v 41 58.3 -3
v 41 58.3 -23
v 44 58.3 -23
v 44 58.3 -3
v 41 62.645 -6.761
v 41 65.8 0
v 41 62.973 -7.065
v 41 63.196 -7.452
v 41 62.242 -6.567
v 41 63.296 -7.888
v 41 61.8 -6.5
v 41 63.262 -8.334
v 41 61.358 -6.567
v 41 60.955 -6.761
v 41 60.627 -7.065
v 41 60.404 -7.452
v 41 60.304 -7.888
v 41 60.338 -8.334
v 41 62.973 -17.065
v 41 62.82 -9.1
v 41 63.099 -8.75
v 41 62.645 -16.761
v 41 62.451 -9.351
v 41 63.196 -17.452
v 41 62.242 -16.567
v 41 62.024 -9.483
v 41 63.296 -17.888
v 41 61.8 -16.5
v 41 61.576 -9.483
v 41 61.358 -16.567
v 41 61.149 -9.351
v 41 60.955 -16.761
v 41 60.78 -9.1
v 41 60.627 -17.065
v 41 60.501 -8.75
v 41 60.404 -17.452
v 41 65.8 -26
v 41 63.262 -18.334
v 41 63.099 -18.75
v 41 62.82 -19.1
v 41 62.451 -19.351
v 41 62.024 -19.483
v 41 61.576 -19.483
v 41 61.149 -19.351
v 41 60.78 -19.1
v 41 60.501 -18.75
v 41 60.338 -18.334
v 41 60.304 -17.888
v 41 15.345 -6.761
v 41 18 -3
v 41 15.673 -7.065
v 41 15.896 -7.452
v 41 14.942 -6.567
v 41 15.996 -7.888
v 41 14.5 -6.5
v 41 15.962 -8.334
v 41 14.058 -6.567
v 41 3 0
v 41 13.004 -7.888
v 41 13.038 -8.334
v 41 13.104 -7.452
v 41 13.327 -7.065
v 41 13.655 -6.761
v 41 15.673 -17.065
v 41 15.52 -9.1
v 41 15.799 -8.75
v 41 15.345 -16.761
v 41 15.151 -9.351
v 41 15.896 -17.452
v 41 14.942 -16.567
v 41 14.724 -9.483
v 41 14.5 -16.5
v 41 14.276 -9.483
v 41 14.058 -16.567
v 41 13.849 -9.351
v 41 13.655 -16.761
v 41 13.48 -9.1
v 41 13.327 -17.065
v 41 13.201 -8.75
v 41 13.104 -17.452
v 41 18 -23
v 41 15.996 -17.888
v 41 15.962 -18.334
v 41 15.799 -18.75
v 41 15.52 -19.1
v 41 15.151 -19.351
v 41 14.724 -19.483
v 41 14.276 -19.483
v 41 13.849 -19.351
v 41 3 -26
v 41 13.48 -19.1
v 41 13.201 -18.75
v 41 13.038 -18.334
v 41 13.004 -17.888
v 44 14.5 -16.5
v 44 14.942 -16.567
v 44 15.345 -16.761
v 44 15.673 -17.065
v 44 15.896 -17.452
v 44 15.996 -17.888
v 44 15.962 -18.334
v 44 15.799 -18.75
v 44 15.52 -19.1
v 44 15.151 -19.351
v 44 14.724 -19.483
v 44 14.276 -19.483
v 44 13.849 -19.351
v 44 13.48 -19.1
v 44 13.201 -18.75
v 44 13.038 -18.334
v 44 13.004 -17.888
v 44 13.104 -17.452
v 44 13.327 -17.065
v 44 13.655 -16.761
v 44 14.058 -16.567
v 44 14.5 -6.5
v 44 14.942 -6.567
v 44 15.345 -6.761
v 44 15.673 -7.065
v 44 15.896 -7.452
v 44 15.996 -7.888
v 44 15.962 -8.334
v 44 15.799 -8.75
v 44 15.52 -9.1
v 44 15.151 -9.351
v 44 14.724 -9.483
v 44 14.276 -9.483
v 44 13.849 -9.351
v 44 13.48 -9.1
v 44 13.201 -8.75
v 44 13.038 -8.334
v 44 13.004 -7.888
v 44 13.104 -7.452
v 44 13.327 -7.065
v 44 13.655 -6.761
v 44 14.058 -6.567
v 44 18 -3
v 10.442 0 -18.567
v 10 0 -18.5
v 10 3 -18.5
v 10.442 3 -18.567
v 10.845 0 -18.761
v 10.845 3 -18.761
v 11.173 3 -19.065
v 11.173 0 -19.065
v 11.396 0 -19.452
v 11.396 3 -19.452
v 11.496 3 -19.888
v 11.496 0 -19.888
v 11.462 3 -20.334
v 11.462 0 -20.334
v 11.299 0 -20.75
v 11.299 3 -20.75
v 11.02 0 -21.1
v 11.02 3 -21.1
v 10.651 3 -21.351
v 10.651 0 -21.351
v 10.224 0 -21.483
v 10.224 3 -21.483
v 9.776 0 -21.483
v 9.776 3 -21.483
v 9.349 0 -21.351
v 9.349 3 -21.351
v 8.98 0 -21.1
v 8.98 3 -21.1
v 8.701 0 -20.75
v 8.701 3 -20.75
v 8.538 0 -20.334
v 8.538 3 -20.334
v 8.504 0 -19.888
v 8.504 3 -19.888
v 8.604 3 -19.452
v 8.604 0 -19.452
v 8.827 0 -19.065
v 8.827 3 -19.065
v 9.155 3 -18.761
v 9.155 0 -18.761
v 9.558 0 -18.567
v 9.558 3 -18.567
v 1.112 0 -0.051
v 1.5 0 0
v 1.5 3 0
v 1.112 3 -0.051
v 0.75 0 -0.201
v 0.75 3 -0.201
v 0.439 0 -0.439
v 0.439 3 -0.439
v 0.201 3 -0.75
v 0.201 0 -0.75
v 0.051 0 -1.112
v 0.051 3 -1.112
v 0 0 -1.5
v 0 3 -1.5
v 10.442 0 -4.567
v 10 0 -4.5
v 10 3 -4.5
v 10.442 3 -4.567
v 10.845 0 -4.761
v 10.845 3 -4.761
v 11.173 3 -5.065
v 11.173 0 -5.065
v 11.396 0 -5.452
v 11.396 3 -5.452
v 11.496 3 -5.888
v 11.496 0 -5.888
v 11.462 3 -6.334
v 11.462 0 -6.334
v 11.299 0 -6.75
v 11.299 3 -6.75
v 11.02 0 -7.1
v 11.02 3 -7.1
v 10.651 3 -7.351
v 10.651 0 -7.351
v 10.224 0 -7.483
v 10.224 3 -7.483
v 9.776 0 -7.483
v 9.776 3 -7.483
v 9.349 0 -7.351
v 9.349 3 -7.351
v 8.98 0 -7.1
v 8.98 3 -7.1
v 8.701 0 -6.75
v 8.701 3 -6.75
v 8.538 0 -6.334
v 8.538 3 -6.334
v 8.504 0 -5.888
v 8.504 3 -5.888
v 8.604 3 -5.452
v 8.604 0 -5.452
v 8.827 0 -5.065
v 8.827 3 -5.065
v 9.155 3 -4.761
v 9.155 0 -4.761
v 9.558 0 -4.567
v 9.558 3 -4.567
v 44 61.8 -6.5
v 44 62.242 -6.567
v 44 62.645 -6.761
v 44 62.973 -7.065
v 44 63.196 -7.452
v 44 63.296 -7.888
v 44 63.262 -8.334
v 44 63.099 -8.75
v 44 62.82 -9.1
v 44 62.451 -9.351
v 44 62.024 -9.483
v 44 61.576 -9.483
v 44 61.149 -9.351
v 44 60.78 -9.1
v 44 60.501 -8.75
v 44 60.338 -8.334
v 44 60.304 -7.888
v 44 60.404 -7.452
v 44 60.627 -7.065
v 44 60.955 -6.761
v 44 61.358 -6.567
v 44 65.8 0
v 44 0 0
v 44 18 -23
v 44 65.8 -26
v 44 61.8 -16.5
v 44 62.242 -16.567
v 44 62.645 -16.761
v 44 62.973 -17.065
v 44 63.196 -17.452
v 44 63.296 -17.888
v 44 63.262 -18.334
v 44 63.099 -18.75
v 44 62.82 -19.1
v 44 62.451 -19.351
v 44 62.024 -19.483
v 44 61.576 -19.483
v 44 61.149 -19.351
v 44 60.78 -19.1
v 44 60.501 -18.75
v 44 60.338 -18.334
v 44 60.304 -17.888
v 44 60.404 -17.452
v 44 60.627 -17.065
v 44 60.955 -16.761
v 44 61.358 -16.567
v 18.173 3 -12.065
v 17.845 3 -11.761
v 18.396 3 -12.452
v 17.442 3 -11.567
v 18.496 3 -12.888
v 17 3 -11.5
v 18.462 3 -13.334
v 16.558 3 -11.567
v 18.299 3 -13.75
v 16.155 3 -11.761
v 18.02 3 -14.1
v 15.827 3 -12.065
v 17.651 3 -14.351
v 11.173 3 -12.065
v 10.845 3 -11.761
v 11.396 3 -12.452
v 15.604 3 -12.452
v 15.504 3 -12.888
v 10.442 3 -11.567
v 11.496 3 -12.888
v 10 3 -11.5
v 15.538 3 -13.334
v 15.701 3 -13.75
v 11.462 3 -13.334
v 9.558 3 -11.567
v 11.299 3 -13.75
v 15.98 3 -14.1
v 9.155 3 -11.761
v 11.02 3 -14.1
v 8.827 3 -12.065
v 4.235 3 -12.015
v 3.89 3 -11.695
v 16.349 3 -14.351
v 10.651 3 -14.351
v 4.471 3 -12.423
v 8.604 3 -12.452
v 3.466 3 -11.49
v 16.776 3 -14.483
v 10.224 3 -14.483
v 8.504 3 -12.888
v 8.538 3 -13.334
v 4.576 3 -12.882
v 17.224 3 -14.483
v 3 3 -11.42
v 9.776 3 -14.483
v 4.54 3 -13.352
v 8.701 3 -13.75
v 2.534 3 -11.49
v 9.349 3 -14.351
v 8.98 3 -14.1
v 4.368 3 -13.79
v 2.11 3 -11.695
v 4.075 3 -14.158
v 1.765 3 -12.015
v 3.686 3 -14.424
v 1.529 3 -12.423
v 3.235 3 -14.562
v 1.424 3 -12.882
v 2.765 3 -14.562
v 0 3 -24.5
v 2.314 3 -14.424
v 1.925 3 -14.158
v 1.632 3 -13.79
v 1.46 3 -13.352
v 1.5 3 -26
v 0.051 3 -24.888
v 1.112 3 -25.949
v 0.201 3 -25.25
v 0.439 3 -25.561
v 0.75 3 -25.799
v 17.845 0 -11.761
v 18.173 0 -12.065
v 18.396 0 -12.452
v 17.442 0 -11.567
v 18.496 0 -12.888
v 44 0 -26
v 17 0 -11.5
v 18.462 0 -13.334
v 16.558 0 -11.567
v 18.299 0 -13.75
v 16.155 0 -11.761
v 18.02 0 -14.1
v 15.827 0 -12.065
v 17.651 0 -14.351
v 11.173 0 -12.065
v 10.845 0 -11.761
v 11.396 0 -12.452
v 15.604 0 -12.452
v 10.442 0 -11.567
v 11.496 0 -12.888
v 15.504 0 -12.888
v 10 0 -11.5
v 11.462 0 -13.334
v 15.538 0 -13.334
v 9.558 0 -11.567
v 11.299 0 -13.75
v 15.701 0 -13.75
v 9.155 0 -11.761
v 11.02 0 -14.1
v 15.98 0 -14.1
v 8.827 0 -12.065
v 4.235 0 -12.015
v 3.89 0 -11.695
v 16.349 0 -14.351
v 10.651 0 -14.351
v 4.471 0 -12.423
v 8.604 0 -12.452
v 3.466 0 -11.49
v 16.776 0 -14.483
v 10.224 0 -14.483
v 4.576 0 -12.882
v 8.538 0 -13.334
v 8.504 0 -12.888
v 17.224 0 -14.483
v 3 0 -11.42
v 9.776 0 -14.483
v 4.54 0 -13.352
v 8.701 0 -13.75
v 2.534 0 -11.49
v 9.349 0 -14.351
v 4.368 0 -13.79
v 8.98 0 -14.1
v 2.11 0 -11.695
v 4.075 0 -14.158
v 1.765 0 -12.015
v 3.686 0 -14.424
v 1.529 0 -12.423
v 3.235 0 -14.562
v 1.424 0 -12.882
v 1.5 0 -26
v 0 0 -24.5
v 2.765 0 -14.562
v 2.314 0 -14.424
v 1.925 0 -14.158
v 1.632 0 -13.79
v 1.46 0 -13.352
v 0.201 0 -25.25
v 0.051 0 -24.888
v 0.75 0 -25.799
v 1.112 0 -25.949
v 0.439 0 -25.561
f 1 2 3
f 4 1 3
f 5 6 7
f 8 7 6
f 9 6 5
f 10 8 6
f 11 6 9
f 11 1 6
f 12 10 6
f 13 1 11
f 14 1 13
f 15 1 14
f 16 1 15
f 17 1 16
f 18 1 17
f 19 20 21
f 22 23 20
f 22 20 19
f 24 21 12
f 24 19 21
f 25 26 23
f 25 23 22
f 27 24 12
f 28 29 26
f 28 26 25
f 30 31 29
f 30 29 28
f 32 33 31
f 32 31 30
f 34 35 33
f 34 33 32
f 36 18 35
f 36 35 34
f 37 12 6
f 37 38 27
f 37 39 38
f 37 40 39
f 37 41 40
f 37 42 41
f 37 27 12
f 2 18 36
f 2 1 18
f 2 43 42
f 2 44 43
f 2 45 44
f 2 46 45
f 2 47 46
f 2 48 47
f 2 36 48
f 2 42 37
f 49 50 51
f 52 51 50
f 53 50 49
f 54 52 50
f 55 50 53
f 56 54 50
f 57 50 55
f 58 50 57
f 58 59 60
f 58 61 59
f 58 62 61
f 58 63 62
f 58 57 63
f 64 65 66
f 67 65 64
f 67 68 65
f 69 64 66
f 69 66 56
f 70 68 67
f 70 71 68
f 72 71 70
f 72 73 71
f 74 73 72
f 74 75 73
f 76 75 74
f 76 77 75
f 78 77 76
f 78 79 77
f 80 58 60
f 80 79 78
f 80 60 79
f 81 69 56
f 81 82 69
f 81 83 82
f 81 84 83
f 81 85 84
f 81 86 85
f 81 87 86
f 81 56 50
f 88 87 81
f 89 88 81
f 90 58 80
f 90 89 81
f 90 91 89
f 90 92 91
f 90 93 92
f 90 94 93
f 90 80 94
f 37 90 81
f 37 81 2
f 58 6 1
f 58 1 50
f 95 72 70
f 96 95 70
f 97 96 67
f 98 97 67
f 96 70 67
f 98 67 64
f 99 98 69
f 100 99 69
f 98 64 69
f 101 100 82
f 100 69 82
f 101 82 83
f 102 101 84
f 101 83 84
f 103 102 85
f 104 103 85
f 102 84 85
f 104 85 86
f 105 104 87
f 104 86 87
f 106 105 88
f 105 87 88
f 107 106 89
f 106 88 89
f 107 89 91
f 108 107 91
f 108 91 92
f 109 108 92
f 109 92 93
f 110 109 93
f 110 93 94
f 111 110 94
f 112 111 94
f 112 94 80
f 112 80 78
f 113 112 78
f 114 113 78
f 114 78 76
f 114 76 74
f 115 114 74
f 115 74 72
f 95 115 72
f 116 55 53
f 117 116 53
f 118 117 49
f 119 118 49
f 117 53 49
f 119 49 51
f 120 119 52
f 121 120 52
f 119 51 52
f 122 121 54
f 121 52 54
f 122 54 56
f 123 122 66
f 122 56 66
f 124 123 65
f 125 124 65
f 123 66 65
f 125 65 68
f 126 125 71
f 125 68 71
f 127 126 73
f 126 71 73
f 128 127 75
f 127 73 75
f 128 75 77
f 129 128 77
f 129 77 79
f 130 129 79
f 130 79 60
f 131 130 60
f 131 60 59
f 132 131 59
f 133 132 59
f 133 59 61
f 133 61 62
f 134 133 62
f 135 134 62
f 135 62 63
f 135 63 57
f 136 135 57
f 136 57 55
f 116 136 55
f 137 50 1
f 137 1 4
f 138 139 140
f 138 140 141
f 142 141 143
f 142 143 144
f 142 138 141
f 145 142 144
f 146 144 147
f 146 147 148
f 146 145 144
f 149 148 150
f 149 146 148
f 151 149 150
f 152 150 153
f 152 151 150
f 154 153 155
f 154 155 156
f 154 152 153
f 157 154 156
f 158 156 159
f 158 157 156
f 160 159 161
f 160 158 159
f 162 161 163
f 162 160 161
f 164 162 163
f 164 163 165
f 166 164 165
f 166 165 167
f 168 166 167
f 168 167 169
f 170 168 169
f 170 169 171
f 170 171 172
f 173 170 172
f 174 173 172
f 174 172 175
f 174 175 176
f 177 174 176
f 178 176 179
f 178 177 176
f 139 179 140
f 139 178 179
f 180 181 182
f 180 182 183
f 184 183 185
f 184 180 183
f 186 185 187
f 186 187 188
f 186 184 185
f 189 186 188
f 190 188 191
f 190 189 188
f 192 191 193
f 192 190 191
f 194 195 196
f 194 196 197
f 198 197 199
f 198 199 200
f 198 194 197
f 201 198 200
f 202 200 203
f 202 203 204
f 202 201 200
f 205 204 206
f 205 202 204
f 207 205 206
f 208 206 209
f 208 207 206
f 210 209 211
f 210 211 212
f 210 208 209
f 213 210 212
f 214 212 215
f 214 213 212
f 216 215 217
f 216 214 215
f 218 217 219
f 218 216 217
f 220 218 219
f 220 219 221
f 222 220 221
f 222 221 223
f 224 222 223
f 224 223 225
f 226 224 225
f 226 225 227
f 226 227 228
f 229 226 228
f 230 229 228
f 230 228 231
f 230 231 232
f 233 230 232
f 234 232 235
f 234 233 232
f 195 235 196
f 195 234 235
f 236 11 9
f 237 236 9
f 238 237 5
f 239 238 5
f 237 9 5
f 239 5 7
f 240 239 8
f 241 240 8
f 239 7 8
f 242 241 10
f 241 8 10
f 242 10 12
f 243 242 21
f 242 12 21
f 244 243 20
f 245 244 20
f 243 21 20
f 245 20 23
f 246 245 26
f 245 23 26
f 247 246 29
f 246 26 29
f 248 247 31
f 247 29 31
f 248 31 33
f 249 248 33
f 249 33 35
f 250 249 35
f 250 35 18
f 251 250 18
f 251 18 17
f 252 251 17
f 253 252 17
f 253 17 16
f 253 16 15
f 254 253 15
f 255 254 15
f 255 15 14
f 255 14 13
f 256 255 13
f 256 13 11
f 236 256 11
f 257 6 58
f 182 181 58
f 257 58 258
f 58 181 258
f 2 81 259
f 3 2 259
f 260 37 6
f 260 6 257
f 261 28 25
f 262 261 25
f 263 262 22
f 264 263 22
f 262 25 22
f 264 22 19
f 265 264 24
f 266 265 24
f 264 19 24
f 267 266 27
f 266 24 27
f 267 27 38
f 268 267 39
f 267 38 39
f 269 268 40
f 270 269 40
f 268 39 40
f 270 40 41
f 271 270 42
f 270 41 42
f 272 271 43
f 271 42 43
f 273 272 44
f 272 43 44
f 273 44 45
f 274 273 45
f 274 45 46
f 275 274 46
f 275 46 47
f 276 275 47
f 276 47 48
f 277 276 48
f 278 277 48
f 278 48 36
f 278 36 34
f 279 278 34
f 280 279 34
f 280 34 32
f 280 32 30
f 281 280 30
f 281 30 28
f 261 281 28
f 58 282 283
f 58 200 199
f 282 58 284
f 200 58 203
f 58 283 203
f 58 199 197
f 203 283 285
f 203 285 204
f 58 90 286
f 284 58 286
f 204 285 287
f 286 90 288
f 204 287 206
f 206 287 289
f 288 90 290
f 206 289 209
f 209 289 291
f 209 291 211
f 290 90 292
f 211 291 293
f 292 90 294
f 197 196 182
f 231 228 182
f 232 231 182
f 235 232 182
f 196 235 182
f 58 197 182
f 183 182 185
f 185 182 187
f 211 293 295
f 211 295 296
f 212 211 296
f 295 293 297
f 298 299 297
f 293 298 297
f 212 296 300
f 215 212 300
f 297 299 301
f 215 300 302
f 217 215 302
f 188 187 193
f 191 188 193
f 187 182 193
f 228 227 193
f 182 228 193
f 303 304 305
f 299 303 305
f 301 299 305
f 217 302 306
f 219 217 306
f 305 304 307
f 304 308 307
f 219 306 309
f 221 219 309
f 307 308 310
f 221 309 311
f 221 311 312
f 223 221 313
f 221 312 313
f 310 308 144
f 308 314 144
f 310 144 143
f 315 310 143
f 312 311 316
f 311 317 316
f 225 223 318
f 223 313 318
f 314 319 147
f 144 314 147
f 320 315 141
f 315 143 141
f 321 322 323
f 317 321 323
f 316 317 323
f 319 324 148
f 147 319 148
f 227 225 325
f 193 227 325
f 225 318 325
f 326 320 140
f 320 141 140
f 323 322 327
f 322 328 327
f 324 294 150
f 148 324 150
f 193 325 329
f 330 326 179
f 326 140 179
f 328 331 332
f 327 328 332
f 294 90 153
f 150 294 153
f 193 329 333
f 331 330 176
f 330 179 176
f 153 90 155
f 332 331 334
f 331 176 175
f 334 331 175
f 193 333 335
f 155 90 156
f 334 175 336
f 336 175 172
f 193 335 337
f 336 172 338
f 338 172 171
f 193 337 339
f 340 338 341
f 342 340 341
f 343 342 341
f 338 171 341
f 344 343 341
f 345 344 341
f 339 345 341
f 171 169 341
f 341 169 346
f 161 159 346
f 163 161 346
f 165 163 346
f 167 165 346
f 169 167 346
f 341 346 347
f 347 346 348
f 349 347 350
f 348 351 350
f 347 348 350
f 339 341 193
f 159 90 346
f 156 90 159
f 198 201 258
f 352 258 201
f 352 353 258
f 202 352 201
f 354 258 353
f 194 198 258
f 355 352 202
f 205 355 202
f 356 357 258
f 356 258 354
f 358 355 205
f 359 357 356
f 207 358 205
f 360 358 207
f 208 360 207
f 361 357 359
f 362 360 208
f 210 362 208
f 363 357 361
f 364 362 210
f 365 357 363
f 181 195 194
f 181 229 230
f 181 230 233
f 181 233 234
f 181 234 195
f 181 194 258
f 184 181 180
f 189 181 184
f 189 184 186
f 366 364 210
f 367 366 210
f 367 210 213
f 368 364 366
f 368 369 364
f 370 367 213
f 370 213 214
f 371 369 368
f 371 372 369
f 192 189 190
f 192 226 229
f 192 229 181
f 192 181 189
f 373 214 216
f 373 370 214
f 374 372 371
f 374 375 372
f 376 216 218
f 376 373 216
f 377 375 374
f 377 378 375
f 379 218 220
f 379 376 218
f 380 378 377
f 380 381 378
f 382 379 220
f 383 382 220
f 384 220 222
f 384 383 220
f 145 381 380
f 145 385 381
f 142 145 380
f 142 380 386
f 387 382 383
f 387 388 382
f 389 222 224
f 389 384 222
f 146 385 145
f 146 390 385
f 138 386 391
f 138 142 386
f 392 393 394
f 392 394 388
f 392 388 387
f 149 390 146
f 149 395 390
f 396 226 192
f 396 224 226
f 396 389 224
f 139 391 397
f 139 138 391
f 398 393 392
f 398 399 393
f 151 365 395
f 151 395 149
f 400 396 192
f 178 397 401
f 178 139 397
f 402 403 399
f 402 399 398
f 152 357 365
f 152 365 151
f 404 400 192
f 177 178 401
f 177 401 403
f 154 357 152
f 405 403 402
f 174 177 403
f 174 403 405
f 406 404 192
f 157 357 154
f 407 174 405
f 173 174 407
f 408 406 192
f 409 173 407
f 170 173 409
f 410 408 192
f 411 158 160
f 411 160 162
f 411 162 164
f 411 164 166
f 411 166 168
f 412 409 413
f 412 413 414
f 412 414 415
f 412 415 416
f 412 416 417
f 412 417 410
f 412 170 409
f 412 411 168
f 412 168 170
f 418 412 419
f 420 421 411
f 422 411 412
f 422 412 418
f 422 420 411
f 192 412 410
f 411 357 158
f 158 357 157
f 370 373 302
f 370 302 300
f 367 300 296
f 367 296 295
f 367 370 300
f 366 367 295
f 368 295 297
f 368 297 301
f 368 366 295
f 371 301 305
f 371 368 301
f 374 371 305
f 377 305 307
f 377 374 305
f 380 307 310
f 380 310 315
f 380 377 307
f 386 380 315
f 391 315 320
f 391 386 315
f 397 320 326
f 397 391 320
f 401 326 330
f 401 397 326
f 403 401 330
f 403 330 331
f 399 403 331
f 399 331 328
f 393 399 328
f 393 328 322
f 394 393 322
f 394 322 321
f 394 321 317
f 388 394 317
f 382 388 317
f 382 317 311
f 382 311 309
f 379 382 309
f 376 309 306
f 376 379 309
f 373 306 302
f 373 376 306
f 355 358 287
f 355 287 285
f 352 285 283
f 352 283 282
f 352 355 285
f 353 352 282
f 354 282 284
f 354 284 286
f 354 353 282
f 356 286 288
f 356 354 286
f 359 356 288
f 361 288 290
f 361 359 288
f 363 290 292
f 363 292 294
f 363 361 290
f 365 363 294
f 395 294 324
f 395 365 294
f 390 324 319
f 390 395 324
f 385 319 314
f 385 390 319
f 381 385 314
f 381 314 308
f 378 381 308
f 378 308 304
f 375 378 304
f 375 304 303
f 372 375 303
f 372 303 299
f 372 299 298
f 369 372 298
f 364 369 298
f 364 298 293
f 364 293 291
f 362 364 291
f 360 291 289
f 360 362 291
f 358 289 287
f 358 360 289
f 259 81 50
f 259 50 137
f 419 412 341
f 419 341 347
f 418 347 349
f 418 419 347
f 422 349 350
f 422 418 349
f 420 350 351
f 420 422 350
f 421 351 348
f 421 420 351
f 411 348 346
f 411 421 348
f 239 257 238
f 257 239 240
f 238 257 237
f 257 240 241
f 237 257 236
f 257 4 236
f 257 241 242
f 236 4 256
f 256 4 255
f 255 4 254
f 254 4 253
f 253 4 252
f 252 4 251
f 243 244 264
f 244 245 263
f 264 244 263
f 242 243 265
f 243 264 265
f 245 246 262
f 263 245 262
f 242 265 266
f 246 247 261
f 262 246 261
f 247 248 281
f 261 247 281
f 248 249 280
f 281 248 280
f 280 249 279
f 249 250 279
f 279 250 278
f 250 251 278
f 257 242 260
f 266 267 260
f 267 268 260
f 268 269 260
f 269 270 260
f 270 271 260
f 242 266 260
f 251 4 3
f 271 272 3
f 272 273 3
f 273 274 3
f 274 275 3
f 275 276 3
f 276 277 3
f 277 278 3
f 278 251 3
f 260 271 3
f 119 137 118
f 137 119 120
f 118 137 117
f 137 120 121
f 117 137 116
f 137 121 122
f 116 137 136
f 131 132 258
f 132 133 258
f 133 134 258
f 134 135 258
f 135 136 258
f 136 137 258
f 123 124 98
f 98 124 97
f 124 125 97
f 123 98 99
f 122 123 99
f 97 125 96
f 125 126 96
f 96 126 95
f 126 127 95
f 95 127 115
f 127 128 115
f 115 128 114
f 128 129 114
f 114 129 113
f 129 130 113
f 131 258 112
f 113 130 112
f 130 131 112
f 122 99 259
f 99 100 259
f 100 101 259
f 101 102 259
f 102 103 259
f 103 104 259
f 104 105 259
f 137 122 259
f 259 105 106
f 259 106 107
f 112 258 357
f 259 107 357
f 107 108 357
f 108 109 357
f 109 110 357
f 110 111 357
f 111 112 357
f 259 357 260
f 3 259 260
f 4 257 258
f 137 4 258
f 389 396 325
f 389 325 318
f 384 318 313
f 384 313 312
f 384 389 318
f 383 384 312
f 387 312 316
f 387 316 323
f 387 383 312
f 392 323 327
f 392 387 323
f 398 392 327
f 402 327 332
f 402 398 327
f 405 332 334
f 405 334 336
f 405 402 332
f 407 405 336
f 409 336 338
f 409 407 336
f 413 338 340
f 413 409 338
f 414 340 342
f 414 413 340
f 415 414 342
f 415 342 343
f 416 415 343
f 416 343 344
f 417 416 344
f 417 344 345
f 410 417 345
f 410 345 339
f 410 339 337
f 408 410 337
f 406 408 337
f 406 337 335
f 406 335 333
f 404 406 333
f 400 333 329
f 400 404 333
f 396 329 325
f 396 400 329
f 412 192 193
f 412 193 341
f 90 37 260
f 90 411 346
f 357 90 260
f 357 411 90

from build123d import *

# Parameters (mm, degrees)
CROQUIS1_R              = 1.5
CROQUIS1_R_2            = 1.58
SALIENTE_EXTRUIR1_DEPTH = 3
CROQUIS2_W              = 3
CROQUIS2_H              = 26
SALIENTE_EXTRUIR2_DEPTH = 15
CROQUIS3_R              = 1.5
CORTAR_EXTRUIR1_DEPTH   = 15
CROQUIS4_W              = 3
CROQUIS4_H              = 3
SALIENTE_EXTRUIR3_DEPTH = 40.3
CROQUIS5_W              = 3
CROQUIS5_H              = 26
SALIENTE_EXTRUIR5_DEPTH = 7.5
CROQUIS6_R              = 1.5
CORTAR_EXTRUIR2_DEPTH   = 7.5


with BuildPart() as part:
    # Croquis1 → Saliente-Extruir1 (new body)
    with BuildSketch(Plane(origin=(0, 0, 0), x_dir=(1, 0, 0), z_dir=(0, 1, 0))):
        with BuildLine():
            Line((0, 1.5), (0, 24.5))
            ThreePointArc((0, 24.5), (0.439339828, 25.560660172), (1.5, 26))
            Line((1.5, 26), (44, 26))
            Line((44, 26), (44, 0))
            Line((44, 0), (1.5, 0))
            ThreePointArc((1.5, 0), (0.439339828, 0.439339828), (0, 1.5))
        make_face()
        with Locations(Location((10, 13, 0), (0, 0, 270))):
            Circle(CROQUIS1_R, mode=Mode.SUBTRACT)
        with Locations(Location((17, 13, 0), (0, 0, 270))):
            Circle(CROQUIS1_R, mode=Mode.SUBTRACT)
        with Locations(Location((10, 20, 0), (0, 0, 270))):
            Circle(CROQUIS1_R, mode=Mode.SUBTRACT)
        with Locations(Location((10, 6, 0), (0, 0, 270))):
            Circle(CROQUIS1_R, mode=Mode.SUBTRACT)
        with Locations(Location((3, 13, 0), (0, 0, 270))):
            Circle(CROQUIS1_R_2, mode=Mode.SUBTRACT)
    extrude(amount=SALIENTE_EXTRUIR1_DEPTH)

    # Croquis2 → Saliente-Extruir2 (add)
    with BuildSketch(Plane(origin=(0, 3, 0), x_dir=(1, 0, 0), z_dir=(0, 1, 0))):
        with Locations((42.5, 13)):
            Rectangle(CROQUIS2_W, CROQUIS2_H)
    extrude(amount=SALIENTE_EXTRUIR2_DEPTH)

    # Croquis3 → Cortar-Extruir1 (cut)
    with BuildSketch(Plane.ZY.offset(-41)):
        with Locations((-18, 14.5)):
            Circle(CROQUIS3_R)
        with Locations((-8, 14.5)):
            Circle(CROQUIS3_R)
    extrude(amount=-CORTAR_EXTRUIR1_DEPTH, mode=Mode.SUBTRACT)

    # Croquis4 → Saliente-Extruir3 (add)
    with BuildSketch(Plane(origin=(0, 18, 0), x_dir=(1, 0, 0), z_dir=(0, 1, 0))):
        with Locations((42.5, 24.5)):
            Rectangle(CROQUIS4_W, CROQUIS4_H)
        with Locations((42.5, 1.5)):
            Rectangle(CROQUIS4_W, CROQUIS4_H)
    extrude(amount=SALIENTE_EXTRUIR3_DEPTH)

    # Croquis5 → Saliente-Extruir5 (add)
    with BuildSketch(Plane(origin=(0, 58.3, 0), x_dir=(1, 0, 0), z_dir=(0, 1, 0))):
        with Locations((42.5, 13)):
            Rectangle(CROQUIS5_W, CROQUIS5_H)
    extrude(amount=SALIENTE_EXTRUIR5_DEPTH)

    # Croquis6 → Cortar-Extruir2 (cut)
    with BuildSketch(Plane.ZY.offset(-41)):
        with Locations((-18, 61.8)):
            Circle(CROQUIS6_R)
        with Locations((-8, 61.8)):
            Circle(CROQUIS6_R)
    extrude(amount=-CORTAR_EXTRUIR2_DEPTH, mode=Mode.SUBTRACT)


solid = part.part
